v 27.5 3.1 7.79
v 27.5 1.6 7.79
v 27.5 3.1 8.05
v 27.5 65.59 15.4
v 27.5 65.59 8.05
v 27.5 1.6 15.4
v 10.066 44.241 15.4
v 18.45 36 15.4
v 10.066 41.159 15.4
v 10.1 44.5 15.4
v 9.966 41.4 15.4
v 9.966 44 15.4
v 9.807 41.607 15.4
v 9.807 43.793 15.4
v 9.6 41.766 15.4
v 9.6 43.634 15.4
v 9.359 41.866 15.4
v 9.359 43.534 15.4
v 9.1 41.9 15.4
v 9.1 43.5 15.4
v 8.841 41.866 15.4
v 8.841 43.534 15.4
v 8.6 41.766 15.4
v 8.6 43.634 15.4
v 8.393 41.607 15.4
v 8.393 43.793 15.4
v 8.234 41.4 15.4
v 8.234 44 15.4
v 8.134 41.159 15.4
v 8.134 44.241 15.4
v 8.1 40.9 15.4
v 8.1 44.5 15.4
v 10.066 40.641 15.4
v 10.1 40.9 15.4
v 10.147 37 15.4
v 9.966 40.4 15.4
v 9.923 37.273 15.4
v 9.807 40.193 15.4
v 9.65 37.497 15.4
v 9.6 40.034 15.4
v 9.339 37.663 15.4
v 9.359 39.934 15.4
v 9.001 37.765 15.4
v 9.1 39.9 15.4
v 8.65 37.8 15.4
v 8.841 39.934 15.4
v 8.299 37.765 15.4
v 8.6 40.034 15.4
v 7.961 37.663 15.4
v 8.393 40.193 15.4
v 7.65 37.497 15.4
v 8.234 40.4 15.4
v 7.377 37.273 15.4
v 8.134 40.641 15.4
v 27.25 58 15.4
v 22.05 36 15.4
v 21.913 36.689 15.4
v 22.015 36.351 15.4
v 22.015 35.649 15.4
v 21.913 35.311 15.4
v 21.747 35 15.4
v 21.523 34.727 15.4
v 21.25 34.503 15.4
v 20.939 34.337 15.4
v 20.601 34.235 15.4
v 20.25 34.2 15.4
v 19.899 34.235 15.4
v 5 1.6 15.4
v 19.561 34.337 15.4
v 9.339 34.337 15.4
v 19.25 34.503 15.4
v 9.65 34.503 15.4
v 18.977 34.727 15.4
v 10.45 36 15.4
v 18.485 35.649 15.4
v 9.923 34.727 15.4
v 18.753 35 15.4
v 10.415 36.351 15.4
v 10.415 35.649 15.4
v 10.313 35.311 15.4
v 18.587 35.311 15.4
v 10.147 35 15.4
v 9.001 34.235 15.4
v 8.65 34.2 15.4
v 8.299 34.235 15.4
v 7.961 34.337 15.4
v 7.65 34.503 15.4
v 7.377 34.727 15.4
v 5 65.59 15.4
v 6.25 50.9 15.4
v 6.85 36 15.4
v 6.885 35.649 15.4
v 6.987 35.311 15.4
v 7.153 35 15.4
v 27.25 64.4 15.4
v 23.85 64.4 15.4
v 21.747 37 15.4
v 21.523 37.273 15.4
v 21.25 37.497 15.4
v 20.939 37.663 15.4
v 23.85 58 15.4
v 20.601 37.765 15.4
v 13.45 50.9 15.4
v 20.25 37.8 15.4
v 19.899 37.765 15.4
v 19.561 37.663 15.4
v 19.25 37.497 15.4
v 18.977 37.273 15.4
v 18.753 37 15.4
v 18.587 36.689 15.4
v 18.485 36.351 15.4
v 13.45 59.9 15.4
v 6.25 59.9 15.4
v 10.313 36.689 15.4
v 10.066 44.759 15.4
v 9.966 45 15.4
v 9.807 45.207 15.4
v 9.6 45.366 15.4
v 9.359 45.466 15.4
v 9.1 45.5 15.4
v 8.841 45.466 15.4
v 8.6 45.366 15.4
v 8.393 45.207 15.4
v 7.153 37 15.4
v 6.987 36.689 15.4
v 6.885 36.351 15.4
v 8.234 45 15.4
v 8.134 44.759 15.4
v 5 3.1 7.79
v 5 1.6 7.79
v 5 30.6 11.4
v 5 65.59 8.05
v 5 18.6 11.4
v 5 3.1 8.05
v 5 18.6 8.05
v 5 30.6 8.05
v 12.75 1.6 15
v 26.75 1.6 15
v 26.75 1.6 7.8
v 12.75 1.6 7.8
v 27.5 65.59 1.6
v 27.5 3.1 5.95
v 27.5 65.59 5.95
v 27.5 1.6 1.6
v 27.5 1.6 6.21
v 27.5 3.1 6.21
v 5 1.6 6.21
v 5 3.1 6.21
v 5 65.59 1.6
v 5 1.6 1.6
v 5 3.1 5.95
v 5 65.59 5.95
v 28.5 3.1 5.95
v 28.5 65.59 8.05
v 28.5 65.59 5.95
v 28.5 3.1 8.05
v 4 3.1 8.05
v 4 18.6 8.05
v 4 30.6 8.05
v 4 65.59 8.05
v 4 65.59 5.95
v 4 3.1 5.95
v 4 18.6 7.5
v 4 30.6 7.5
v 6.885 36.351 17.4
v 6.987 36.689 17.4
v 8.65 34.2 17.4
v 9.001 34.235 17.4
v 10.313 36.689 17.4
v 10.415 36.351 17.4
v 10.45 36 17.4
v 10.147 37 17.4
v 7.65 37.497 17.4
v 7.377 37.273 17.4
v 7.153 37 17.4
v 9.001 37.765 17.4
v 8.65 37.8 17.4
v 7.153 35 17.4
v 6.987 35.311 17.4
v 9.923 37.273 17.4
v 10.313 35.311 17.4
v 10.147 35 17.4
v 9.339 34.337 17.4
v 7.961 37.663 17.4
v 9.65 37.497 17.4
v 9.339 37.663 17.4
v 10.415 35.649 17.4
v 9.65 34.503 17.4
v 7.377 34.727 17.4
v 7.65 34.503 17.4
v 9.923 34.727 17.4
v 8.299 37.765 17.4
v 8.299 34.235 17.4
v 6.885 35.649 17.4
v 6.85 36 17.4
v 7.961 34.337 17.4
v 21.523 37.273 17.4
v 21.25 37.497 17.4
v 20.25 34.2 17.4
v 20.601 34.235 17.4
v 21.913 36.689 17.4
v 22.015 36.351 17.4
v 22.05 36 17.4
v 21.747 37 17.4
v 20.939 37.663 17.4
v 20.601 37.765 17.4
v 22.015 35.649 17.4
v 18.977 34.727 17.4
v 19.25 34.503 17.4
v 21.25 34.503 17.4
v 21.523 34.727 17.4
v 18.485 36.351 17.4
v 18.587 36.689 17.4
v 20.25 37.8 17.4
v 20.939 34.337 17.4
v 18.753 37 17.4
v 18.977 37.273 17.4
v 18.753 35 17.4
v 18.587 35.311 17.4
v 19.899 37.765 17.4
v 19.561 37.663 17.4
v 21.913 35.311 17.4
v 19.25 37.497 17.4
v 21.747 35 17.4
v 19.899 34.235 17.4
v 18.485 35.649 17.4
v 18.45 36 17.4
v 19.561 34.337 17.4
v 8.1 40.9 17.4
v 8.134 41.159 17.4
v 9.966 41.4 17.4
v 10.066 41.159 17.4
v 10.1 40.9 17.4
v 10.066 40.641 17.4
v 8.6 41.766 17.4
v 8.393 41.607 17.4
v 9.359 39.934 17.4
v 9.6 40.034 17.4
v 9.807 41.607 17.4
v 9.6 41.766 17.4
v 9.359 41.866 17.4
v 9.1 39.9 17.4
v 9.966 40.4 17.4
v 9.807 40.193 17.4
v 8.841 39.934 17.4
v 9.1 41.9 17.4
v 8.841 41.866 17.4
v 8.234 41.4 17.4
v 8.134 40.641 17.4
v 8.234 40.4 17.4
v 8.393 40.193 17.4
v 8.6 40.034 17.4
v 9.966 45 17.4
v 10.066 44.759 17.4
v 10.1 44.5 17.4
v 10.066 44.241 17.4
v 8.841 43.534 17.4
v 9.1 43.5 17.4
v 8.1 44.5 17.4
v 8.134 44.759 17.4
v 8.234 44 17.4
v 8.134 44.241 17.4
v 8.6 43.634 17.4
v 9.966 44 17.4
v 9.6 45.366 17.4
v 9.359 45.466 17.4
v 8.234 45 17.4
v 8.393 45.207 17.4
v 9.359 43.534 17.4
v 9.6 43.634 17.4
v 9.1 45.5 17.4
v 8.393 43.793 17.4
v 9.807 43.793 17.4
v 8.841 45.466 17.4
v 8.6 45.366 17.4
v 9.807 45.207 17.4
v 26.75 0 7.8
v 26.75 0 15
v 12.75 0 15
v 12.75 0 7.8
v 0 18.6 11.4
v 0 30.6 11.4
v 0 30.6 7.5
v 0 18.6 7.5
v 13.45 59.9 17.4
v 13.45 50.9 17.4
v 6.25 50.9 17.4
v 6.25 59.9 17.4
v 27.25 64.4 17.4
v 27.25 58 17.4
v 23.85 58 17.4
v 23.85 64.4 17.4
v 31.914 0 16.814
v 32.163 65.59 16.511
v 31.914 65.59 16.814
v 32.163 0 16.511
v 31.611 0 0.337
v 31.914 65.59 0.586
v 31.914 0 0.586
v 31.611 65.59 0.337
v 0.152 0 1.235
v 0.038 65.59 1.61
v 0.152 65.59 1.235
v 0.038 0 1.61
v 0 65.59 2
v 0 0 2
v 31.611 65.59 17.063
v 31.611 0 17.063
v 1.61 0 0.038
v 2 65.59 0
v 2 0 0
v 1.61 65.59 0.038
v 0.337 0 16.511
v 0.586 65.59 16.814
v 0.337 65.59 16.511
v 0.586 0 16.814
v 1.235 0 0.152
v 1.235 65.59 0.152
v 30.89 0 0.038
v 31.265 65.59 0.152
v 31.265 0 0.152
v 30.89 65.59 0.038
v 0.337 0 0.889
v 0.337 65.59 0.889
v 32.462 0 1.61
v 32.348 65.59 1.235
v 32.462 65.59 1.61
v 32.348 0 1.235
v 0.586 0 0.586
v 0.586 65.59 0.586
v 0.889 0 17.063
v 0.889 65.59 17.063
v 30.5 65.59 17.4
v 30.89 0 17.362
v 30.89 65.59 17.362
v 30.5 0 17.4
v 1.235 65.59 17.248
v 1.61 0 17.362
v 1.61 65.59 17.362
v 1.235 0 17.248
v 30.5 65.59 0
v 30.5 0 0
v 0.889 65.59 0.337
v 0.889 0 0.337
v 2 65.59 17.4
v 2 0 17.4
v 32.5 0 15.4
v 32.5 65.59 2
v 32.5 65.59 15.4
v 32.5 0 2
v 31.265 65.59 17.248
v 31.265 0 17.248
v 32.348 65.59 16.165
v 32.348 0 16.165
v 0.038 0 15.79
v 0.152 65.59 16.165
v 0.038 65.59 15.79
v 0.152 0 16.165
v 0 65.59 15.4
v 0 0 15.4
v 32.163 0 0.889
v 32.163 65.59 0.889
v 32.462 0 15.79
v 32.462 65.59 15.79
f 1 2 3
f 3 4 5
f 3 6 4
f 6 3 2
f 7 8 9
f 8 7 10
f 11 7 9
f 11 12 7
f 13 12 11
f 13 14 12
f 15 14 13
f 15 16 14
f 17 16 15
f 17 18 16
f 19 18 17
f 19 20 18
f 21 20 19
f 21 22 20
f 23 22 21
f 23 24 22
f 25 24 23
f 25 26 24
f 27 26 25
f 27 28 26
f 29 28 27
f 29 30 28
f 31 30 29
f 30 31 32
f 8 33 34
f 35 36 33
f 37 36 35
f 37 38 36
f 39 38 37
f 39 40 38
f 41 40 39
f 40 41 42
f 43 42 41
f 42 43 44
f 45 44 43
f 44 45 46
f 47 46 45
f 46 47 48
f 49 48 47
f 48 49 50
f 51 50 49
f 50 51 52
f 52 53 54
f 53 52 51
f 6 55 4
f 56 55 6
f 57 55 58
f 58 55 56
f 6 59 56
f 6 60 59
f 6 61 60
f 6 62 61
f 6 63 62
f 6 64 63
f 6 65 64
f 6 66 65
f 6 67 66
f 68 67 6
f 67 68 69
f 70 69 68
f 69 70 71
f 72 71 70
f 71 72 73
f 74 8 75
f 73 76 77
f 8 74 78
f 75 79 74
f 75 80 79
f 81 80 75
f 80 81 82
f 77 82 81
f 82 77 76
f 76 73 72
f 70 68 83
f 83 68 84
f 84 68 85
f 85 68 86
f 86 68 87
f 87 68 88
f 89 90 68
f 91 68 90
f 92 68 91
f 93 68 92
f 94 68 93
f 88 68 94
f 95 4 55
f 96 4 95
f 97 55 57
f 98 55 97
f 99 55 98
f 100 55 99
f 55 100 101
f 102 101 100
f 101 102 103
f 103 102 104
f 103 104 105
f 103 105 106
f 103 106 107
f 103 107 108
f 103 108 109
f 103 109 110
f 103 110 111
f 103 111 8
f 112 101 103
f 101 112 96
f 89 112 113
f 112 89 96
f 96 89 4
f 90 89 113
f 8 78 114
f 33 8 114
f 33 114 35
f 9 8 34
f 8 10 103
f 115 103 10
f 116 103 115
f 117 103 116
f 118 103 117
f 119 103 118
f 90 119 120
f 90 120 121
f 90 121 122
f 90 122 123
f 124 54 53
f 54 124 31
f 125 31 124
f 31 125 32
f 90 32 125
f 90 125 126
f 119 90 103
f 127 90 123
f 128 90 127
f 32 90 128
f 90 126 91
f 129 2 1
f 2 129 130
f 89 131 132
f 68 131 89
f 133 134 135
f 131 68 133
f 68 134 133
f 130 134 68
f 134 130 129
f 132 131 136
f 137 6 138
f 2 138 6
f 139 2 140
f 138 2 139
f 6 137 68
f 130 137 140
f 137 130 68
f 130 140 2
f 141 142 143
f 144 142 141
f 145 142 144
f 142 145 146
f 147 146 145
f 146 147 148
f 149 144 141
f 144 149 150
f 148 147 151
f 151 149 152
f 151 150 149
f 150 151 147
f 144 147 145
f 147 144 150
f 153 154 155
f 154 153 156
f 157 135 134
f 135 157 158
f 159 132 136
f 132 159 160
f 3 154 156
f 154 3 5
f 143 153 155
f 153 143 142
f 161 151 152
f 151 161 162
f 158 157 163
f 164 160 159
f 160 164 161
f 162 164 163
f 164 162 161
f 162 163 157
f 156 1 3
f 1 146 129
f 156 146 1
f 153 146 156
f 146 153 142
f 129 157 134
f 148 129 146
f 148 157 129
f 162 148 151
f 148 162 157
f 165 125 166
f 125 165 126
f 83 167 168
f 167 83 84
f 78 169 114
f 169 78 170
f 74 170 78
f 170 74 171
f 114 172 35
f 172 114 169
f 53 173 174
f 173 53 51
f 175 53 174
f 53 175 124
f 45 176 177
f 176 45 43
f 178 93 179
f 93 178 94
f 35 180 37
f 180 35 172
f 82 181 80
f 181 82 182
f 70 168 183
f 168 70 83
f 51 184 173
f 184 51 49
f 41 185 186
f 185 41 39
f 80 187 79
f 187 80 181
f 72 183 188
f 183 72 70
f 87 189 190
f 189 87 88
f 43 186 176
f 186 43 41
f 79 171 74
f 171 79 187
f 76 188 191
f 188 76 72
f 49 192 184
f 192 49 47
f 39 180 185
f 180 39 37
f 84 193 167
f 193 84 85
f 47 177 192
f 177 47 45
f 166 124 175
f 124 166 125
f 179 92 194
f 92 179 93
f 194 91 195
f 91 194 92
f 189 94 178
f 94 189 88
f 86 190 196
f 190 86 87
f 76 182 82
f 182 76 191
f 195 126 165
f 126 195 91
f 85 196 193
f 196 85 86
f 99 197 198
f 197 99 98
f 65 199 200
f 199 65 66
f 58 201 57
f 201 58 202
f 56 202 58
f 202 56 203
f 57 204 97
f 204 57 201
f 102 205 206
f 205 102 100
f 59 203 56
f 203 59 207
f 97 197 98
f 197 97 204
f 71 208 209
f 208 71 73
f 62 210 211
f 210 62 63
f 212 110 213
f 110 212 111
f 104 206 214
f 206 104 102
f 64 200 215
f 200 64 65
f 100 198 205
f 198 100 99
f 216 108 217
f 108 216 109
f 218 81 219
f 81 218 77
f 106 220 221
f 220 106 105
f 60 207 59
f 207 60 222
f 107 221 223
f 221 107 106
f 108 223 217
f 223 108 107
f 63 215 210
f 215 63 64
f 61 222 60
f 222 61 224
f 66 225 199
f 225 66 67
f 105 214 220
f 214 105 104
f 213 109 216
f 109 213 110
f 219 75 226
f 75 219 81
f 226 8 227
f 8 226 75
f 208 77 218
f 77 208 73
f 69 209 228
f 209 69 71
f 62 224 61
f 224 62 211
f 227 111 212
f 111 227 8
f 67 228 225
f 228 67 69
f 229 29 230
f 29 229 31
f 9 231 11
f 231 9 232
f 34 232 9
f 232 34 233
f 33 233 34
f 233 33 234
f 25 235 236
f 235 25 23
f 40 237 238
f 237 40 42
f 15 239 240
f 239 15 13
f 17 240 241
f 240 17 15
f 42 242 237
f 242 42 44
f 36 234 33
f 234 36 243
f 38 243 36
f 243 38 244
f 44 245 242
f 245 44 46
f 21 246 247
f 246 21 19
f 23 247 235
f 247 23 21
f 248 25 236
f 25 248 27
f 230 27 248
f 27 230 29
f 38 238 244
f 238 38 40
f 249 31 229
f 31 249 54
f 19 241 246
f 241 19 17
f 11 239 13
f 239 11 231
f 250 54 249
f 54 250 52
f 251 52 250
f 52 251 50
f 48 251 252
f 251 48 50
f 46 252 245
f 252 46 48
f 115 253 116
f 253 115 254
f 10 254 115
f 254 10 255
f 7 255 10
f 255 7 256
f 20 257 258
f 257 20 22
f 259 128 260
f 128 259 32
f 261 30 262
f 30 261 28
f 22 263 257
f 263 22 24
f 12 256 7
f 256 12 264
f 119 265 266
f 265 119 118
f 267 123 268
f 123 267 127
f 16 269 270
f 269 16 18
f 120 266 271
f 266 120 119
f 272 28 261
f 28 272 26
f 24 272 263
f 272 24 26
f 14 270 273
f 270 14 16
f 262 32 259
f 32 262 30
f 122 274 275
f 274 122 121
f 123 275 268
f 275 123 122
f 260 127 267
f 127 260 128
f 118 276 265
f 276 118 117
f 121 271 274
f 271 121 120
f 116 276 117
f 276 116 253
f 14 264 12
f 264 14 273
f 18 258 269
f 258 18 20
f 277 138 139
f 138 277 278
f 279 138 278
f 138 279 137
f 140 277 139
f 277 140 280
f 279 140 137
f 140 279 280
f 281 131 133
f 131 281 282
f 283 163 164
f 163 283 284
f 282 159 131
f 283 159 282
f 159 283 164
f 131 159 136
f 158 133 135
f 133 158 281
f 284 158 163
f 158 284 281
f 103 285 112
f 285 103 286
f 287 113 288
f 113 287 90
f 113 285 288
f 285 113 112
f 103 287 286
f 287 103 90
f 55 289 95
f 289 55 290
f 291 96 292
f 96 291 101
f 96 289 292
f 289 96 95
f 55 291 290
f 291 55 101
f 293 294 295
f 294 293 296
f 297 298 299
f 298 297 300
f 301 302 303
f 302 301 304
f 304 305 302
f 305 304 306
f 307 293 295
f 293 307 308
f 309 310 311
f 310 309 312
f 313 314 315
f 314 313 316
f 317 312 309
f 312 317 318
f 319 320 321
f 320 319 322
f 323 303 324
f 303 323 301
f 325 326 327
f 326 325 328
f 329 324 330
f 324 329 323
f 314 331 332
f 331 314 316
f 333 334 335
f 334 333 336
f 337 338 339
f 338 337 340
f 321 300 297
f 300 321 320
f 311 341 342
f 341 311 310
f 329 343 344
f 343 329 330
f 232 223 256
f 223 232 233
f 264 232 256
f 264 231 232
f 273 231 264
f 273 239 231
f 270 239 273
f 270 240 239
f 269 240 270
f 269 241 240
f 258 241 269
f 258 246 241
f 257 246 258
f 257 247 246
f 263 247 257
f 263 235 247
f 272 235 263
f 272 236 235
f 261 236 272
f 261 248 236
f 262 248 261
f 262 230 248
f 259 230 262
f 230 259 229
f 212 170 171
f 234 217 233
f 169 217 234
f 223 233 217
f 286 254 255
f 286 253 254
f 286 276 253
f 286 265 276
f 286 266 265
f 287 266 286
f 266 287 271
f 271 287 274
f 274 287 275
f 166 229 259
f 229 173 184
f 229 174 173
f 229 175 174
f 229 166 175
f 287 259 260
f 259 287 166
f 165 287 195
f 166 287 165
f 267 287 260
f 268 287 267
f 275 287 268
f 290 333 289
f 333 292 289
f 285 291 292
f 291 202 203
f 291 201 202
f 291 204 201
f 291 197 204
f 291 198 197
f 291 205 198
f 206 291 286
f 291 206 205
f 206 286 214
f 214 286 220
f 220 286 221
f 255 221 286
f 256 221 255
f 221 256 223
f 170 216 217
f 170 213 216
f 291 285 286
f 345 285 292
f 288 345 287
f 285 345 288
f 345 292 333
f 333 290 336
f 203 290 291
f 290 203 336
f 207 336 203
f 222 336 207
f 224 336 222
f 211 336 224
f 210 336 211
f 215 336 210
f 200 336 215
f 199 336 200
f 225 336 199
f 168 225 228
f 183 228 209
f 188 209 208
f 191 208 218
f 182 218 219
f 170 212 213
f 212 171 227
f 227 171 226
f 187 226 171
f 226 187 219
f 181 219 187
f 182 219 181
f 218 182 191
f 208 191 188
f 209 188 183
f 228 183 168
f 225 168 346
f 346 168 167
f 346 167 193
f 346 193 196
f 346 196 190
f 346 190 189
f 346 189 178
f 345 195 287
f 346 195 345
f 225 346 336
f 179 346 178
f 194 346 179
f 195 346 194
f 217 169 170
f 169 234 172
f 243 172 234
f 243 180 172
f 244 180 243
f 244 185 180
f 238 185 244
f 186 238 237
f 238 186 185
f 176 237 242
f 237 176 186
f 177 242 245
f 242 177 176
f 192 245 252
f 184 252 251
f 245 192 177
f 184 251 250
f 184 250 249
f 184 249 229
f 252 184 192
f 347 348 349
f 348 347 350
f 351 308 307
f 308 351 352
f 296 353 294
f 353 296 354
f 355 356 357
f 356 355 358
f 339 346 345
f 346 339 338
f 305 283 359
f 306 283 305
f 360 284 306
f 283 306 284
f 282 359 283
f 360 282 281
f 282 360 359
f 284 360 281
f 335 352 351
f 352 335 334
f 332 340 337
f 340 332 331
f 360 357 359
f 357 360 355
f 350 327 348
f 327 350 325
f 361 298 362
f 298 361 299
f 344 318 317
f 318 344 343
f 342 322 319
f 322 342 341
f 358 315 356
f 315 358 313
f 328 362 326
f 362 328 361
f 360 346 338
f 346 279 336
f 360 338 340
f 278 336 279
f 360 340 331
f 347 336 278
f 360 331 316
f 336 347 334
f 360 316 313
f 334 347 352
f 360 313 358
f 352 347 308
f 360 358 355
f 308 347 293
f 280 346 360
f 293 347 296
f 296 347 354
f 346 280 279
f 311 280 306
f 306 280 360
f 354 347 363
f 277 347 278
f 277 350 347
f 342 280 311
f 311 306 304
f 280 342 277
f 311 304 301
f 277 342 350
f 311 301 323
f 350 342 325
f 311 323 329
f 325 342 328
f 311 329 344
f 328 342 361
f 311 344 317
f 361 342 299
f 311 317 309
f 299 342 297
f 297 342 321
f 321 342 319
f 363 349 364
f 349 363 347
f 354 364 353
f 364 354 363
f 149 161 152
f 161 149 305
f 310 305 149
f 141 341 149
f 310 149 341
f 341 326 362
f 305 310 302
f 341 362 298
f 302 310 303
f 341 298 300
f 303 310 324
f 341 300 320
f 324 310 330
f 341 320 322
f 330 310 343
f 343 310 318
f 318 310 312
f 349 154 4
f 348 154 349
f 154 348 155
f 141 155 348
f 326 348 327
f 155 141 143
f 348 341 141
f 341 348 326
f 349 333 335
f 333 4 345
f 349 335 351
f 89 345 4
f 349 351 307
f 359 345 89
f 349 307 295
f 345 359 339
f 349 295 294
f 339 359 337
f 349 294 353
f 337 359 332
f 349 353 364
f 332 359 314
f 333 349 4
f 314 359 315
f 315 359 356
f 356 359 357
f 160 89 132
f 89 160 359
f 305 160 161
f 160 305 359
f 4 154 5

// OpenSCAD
// esp32-joystick2trainer JR bay module: 3D printed sleeve case.
//
// The PCB (22 x 62 x 1.6 mm) slides into the sleeve from the bay end; it is held by
// slots in the long walls. The bay end stays open: the 5-pin header protrudes there and
// the radio's bay closes it. The top end (USB-A) is closed except for the receptacle.
//
// Coordinates follow the PCB: x across the board (0..22), y along it (0 = USB-A end,
// 62 = bay end), z through the board (0 = board bottom face towards the radio,
// 1.6 = component side towards the pilot).
//
// Render:   openscad -o case_std.stl -D 'variant="std"' case.scad
//           openscad -o case_lite.stl -D 'variant="lite"' case.scad
//
// EVERY outer dimension below is a starting point: measure your radio's bay (width,
// thickness, depth, position of the 5-pin socket) before printing. See
// hardware/README.md, "Measurements to take on the radio".

variant = "std";          // "std" (standard JR bay) or "lite" (JR Lite / nano bay)

// ---- board ----------------------------------------------------------------
pcb_w = 22.0;
pcb_l = 62.0;
pcb_t = 1.6;
slot_clear = 0.25;        // per side, board-to-slot
slot_depth = 1.0;         // how far the board enters each side wall

// ---- clearances above and below the board ---------------------------------
top_clear = 7.6;          // USB-A receptacle is the tallest part on the component side
bottom_clear = 4.6;       // buck inductor (4.0 mm) + solder on the radio side

// ---- outer envelope per variant (TO BE MEASURED on the radio) ------------
outer_w = (variant == "std") ? 32.5 : 25.0;
outer_t = (variant == "std") ? 17.4 : 17.0;   // the USB-A receptacle (7.2 mm) sets the minimum
lip = 2.0;                // extra length at the USB-A end beyond the board
wall = 1.6;
end_wall = 1.6;

// ---- derived -------------------------------------------------------------
inner_w = pcb_w + 2 * slot_clear;                  // slot-to-slot width
side_wall = (outer_w - inner_w) / 2 + slot_depth;  // thick enough to carry the slot
case_l = pcb_l + end_wall + lip;
z_board = wall + bottom_clear;                      // board bottom face inside the case
assert(outer_t >= wall + bottom_clear + pcb_t + top_clear + wall,
       "outer_t too small for the board and its components");
eps = 0.01;

// ---- openings (board coordinates) ----------------------------------------
// USB-A receptacle in the end wall: 13.2 mm wide, opening at the top edge of the board
usba_x = [14.5 - 7.0, 14.5 + 7.0];
usba_z = [pcb_t, pcb_t + 7.2];
// USB-C on the left edge (x = 0), y 15.7..26.4
usbc_y = [15.0, 27.0];
usbc_z = [pcb_t - 0.3, pcb_t + 3.6];
// buttons on the component side: BOOT (SW2) and RESET (SW1)
buttons = [[3.4, 32.4], [15.0, 32.4]];
button_d = 3.6;
// LEDs: status (D5) and power (D6)
leds = [[3.85, 37.3], [3.85, 40.9]];
led_d = 2.0;
// AUX header J3 (GND/SBUS/CPPM) and I2C pins J4 on the component side
aux_x = [1.0, 8.2];  aux_y = [47.3, 56.3];
i2c_x = [18.6, 22.0]; i2c_y = [54.4, 60.8];
// solder jumpers stay covered; the bay header plastic body sits below the slot line

module board_frame() {
    // translate board coordinates to case coordinates
    translate([ (outer_w - pcb_w) / 2, end_wall + lip, z_board ]) children();
}

module outer() {
    hull() {
        for (x = [2, outer_w - 2], z = [2, outer_t - 2])
            translate([x, 0, z]) rotate([-90, 0, 0]) cylinder(r = 2, h = case_l, $fn = 32);
    }
}

module cavity() {
    board_frame() {
        // room above the board
        translate([-slot_clear, -lip, pcb_t - eps])
            cube([inner_w, pcb_l + lip + 1, top_clear + eps]);
        // room below the board
        translate([-slot_clear, -lip, -bottom_clear])
            cube([inner_w, pcb_l + lip + 1, bottom_clear + eps]);
        // the board itself plus the slots in the side walls
        translate([-slot_clear - slot_depth, -0.5, -slot_clear])
            cube([inner_w + 2 * slot_depth, pcb_l + 1.5, pcb_t + 2 * slot_clear]);
    }
}

module openings() {
    board_frame() {
        // USB-A through the end wall
        translate([usba_x[0], -lip - end_wall - 1, usba_z[0]])
            cube([usba_x[1] - usba_x[0], lip + end_wall + 2, usba_z[1] - usba_z[0]]);
        // USB-C through the left wall
        translate([-slot_clear - side_wall - 1, usbc_y[0], usbc_z[0]])
            cube([side_wall + 2, usbc_y[1] - usbc_y[0], usbc_z[1] - usbc_z[0]]);
        // buttons and LEDs through the component-side face
        for (b = buttons)
            translate([b[0], b[1], pcb_t]) cylinder(d = button_d, h = top_clear + wall + 1, $fn = 32);
        for (l = leds)
            translate([l[0], l[1], pcb_t]) cylinder(d = led_d, h = top_clear + wall + 1, $fn = 24);
        // AUX header and I2C pins
        translate([aux_x[0], aux_y[0], pcb_t]) cube([aux_x[1] - aux_x[0], aux_y[1] - aux_y[0], top_clear + wall + 1]);
        translate([i2c_x[0], i2c_y[0], pcb_t]) cube([i2c_x[1] - i2c_x[0], i2c_y[1] - i2c_y[0], top_clear + wall + 1]);
    }
}

module case() {
    difference() {
        outer();
        cavity();
        openings();
        // open bay end
        board_frame() translate([-slot_clear - side_wall - 1, pcb_l - 0.01, -bottom_clear - wall - 1])
            cube([inner_w + 2 * side_wall + 2, end_wall + 2, outer_t + 2]);
    }
}

case();
